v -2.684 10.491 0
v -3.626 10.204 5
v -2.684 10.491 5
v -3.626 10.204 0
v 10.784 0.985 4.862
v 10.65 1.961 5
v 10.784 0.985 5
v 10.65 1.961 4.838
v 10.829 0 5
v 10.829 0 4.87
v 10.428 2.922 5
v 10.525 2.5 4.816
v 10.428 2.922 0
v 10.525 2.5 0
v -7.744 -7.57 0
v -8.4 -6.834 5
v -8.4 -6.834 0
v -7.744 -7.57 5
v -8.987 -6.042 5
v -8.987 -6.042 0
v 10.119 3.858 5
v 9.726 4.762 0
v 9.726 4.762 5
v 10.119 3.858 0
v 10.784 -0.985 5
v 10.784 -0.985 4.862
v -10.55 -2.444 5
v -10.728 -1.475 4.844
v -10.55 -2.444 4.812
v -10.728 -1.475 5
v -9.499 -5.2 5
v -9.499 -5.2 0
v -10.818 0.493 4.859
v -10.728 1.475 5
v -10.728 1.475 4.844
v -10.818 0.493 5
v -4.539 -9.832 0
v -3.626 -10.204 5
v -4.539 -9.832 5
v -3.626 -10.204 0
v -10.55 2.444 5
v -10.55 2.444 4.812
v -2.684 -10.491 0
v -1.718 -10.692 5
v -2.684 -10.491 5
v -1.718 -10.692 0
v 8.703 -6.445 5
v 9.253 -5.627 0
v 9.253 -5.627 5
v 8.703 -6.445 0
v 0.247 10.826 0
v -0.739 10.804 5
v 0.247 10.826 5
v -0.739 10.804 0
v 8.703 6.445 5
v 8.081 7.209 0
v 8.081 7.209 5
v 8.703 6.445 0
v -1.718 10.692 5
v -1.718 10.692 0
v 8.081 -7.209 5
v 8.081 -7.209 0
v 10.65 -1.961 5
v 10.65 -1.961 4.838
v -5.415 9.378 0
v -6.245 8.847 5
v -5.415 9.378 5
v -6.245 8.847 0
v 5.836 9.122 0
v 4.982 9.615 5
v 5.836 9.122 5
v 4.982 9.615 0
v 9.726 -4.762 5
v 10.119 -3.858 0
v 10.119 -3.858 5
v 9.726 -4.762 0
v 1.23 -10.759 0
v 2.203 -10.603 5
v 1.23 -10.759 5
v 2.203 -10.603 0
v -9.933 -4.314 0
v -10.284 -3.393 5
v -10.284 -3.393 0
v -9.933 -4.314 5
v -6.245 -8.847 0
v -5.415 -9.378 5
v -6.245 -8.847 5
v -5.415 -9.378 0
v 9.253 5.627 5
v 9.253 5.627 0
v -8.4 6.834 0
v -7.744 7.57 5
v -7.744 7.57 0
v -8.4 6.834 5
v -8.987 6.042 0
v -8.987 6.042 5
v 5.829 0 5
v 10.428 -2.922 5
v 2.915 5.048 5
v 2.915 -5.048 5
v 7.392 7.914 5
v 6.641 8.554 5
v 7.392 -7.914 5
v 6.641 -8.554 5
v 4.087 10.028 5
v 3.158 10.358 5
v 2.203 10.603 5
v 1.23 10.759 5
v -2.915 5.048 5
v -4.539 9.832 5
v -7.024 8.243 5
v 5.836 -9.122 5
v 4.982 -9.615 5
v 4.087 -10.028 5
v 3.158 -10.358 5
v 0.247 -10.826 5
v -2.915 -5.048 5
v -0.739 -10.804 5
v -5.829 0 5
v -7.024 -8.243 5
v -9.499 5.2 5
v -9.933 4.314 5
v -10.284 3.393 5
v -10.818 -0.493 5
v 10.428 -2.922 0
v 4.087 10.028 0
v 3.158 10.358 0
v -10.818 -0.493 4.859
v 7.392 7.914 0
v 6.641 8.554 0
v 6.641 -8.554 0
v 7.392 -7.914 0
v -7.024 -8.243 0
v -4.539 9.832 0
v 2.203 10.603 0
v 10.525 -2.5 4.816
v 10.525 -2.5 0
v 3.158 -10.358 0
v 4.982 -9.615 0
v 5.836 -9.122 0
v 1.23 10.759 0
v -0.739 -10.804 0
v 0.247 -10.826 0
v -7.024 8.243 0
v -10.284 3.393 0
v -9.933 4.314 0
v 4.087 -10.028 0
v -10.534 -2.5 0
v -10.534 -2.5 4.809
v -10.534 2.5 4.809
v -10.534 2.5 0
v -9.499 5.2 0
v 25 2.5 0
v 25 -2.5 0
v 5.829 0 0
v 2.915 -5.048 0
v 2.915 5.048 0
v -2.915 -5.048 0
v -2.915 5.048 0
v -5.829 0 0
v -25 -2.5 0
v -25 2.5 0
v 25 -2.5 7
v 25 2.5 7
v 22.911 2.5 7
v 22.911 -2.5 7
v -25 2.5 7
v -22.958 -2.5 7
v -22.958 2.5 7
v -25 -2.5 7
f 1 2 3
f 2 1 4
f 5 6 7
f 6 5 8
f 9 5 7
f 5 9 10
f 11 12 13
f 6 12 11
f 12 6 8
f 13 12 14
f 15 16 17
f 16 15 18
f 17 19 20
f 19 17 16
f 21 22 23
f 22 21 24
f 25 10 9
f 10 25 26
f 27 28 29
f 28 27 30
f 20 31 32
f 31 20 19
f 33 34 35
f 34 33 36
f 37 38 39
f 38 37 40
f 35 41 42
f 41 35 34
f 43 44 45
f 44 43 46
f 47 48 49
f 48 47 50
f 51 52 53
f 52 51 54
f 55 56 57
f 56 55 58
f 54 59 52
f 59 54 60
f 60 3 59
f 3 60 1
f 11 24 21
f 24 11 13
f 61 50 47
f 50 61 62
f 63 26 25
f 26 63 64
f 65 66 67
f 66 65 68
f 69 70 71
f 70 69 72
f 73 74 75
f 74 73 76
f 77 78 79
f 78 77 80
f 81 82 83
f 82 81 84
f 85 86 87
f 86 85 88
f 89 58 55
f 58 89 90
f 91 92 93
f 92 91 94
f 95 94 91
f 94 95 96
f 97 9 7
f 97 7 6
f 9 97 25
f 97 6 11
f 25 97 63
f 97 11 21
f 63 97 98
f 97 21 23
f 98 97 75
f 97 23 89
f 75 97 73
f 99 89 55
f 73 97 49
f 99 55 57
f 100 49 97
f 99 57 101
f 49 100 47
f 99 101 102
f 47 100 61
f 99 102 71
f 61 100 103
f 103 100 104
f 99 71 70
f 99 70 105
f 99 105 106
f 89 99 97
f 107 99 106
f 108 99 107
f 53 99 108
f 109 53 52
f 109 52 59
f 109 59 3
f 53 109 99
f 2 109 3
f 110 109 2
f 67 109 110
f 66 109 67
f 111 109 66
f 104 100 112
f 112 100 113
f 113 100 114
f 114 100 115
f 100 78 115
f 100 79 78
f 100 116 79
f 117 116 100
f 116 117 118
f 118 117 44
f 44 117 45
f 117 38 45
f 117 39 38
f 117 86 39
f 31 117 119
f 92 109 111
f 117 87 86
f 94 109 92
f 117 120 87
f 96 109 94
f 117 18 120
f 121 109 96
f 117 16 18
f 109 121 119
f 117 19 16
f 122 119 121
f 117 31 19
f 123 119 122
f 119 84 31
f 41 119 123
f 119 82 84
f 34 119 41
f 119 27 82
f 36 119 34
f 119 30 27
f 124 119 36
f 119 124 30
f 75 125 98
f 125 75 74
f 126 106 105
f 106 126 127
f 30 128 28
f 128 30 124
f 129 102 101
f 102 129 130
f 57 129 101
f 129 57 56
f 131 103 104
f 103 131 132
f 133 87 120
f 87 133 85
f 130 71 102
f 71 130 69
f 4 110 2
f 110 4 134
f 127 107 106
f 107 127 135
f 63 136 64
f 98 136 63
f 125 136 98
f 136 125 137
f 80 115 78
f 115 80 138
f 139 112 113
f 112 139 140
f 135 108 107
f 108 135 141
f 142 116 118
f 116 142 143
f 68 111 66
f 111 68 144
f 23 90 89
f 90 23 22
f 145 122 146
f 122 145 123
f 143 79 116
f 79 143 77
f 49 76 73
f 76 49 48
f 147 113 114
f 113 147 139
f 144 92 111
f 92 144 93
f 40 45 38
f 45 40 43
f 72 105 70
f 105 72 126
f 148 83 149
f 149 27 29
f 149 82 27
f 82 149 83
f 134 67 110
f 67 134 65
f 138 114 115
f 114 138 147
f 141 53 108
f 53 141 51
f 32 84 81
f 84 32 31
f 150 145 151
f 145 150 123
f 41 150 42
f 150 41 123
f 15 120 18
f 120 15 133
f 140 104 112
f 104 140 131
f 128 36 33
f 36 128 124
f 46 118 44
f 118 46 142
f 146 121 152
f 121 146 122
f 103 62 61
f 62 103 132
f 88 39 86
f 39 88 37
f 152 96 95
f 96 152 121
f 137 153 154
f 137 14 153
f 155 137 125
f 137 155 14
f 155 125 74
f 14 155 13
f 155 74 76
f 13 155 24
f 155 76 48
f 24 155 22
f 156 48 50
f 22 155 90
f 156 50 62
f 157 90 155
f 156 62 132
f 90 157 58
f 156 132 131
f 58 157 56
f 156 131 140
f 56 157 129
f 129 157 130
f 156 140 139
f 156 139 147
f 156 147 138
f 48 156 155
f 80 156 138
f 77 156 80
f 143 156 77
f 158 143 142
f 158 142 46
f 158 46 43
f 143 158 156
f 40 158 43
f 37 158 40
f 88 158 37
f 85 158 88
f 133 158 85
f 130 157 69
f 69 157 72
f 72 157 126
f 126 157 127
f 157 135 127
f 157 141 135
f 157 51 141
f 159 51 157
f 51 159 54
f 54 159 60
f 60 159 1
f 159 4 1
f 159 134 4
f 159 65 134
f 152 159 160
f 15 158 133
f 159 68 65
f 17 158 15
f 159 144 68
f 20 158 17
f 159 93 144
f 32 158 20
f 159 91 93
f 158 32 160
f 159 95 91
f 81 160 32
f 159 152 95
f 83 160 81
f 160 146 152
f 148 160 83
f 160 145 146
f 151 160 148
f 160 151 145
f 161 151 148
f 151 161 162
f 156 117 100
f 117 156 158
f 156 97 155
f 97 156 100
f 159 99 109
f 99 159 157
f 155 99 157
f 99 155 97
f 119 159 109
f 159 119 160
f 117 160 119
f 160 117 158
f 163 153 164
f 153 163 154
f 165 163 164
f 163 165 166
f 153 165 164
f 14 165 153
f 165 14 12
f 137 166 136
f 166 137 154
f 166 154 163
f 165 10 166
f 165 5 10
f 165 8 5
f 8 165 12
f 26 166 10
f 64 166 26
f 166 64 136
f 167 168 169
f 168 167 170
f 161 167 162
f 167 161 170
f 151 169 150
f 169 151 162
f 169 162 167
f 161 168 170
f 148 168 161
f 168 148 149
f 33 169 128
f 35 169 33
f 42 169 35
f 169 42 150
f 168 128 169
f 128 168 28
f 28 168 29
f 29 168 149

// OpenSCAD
/*
 * Simple key-spanner for tightening retaining bolt.
 */

$fa = 1;
$fs = 1;

// Needs to be at least 2 for a very snug fit, and higher to give some leeway
Fudge = 6;
Wall = 5;

in = 25.4;
Depth = 5;
// Width = 7/16*in;
// Width = 10;
Width = 3/8*in;
Diameter = Width / cos(30);
R = Diameter * (1 + Fudge/100) / 2;

// Nut holder
difference() {
  cylinder(r=R+Wall, h=Depth);
  cylinder(r=R, h=Depth, $fn=6);
}

// Wings
translate([0,-1*Wall/2,0]){
    intersection(){
        cube([25,Wall,7]);
        translate([10,0,-3.4]){
            rotate(a=-10, v=[0,1,0]){
                cube([25,Wall, 8]);
            }
        }
    }
    translate([-25, 0, 0]) {
        intersection(){
                cube([25,Wall, 7]);
                translate([-10,0,1]){
                rotate(a=10, v=[0,1,0]){
                  cube([25, Wall, 8]);
                }
            }
        }
    }
}
